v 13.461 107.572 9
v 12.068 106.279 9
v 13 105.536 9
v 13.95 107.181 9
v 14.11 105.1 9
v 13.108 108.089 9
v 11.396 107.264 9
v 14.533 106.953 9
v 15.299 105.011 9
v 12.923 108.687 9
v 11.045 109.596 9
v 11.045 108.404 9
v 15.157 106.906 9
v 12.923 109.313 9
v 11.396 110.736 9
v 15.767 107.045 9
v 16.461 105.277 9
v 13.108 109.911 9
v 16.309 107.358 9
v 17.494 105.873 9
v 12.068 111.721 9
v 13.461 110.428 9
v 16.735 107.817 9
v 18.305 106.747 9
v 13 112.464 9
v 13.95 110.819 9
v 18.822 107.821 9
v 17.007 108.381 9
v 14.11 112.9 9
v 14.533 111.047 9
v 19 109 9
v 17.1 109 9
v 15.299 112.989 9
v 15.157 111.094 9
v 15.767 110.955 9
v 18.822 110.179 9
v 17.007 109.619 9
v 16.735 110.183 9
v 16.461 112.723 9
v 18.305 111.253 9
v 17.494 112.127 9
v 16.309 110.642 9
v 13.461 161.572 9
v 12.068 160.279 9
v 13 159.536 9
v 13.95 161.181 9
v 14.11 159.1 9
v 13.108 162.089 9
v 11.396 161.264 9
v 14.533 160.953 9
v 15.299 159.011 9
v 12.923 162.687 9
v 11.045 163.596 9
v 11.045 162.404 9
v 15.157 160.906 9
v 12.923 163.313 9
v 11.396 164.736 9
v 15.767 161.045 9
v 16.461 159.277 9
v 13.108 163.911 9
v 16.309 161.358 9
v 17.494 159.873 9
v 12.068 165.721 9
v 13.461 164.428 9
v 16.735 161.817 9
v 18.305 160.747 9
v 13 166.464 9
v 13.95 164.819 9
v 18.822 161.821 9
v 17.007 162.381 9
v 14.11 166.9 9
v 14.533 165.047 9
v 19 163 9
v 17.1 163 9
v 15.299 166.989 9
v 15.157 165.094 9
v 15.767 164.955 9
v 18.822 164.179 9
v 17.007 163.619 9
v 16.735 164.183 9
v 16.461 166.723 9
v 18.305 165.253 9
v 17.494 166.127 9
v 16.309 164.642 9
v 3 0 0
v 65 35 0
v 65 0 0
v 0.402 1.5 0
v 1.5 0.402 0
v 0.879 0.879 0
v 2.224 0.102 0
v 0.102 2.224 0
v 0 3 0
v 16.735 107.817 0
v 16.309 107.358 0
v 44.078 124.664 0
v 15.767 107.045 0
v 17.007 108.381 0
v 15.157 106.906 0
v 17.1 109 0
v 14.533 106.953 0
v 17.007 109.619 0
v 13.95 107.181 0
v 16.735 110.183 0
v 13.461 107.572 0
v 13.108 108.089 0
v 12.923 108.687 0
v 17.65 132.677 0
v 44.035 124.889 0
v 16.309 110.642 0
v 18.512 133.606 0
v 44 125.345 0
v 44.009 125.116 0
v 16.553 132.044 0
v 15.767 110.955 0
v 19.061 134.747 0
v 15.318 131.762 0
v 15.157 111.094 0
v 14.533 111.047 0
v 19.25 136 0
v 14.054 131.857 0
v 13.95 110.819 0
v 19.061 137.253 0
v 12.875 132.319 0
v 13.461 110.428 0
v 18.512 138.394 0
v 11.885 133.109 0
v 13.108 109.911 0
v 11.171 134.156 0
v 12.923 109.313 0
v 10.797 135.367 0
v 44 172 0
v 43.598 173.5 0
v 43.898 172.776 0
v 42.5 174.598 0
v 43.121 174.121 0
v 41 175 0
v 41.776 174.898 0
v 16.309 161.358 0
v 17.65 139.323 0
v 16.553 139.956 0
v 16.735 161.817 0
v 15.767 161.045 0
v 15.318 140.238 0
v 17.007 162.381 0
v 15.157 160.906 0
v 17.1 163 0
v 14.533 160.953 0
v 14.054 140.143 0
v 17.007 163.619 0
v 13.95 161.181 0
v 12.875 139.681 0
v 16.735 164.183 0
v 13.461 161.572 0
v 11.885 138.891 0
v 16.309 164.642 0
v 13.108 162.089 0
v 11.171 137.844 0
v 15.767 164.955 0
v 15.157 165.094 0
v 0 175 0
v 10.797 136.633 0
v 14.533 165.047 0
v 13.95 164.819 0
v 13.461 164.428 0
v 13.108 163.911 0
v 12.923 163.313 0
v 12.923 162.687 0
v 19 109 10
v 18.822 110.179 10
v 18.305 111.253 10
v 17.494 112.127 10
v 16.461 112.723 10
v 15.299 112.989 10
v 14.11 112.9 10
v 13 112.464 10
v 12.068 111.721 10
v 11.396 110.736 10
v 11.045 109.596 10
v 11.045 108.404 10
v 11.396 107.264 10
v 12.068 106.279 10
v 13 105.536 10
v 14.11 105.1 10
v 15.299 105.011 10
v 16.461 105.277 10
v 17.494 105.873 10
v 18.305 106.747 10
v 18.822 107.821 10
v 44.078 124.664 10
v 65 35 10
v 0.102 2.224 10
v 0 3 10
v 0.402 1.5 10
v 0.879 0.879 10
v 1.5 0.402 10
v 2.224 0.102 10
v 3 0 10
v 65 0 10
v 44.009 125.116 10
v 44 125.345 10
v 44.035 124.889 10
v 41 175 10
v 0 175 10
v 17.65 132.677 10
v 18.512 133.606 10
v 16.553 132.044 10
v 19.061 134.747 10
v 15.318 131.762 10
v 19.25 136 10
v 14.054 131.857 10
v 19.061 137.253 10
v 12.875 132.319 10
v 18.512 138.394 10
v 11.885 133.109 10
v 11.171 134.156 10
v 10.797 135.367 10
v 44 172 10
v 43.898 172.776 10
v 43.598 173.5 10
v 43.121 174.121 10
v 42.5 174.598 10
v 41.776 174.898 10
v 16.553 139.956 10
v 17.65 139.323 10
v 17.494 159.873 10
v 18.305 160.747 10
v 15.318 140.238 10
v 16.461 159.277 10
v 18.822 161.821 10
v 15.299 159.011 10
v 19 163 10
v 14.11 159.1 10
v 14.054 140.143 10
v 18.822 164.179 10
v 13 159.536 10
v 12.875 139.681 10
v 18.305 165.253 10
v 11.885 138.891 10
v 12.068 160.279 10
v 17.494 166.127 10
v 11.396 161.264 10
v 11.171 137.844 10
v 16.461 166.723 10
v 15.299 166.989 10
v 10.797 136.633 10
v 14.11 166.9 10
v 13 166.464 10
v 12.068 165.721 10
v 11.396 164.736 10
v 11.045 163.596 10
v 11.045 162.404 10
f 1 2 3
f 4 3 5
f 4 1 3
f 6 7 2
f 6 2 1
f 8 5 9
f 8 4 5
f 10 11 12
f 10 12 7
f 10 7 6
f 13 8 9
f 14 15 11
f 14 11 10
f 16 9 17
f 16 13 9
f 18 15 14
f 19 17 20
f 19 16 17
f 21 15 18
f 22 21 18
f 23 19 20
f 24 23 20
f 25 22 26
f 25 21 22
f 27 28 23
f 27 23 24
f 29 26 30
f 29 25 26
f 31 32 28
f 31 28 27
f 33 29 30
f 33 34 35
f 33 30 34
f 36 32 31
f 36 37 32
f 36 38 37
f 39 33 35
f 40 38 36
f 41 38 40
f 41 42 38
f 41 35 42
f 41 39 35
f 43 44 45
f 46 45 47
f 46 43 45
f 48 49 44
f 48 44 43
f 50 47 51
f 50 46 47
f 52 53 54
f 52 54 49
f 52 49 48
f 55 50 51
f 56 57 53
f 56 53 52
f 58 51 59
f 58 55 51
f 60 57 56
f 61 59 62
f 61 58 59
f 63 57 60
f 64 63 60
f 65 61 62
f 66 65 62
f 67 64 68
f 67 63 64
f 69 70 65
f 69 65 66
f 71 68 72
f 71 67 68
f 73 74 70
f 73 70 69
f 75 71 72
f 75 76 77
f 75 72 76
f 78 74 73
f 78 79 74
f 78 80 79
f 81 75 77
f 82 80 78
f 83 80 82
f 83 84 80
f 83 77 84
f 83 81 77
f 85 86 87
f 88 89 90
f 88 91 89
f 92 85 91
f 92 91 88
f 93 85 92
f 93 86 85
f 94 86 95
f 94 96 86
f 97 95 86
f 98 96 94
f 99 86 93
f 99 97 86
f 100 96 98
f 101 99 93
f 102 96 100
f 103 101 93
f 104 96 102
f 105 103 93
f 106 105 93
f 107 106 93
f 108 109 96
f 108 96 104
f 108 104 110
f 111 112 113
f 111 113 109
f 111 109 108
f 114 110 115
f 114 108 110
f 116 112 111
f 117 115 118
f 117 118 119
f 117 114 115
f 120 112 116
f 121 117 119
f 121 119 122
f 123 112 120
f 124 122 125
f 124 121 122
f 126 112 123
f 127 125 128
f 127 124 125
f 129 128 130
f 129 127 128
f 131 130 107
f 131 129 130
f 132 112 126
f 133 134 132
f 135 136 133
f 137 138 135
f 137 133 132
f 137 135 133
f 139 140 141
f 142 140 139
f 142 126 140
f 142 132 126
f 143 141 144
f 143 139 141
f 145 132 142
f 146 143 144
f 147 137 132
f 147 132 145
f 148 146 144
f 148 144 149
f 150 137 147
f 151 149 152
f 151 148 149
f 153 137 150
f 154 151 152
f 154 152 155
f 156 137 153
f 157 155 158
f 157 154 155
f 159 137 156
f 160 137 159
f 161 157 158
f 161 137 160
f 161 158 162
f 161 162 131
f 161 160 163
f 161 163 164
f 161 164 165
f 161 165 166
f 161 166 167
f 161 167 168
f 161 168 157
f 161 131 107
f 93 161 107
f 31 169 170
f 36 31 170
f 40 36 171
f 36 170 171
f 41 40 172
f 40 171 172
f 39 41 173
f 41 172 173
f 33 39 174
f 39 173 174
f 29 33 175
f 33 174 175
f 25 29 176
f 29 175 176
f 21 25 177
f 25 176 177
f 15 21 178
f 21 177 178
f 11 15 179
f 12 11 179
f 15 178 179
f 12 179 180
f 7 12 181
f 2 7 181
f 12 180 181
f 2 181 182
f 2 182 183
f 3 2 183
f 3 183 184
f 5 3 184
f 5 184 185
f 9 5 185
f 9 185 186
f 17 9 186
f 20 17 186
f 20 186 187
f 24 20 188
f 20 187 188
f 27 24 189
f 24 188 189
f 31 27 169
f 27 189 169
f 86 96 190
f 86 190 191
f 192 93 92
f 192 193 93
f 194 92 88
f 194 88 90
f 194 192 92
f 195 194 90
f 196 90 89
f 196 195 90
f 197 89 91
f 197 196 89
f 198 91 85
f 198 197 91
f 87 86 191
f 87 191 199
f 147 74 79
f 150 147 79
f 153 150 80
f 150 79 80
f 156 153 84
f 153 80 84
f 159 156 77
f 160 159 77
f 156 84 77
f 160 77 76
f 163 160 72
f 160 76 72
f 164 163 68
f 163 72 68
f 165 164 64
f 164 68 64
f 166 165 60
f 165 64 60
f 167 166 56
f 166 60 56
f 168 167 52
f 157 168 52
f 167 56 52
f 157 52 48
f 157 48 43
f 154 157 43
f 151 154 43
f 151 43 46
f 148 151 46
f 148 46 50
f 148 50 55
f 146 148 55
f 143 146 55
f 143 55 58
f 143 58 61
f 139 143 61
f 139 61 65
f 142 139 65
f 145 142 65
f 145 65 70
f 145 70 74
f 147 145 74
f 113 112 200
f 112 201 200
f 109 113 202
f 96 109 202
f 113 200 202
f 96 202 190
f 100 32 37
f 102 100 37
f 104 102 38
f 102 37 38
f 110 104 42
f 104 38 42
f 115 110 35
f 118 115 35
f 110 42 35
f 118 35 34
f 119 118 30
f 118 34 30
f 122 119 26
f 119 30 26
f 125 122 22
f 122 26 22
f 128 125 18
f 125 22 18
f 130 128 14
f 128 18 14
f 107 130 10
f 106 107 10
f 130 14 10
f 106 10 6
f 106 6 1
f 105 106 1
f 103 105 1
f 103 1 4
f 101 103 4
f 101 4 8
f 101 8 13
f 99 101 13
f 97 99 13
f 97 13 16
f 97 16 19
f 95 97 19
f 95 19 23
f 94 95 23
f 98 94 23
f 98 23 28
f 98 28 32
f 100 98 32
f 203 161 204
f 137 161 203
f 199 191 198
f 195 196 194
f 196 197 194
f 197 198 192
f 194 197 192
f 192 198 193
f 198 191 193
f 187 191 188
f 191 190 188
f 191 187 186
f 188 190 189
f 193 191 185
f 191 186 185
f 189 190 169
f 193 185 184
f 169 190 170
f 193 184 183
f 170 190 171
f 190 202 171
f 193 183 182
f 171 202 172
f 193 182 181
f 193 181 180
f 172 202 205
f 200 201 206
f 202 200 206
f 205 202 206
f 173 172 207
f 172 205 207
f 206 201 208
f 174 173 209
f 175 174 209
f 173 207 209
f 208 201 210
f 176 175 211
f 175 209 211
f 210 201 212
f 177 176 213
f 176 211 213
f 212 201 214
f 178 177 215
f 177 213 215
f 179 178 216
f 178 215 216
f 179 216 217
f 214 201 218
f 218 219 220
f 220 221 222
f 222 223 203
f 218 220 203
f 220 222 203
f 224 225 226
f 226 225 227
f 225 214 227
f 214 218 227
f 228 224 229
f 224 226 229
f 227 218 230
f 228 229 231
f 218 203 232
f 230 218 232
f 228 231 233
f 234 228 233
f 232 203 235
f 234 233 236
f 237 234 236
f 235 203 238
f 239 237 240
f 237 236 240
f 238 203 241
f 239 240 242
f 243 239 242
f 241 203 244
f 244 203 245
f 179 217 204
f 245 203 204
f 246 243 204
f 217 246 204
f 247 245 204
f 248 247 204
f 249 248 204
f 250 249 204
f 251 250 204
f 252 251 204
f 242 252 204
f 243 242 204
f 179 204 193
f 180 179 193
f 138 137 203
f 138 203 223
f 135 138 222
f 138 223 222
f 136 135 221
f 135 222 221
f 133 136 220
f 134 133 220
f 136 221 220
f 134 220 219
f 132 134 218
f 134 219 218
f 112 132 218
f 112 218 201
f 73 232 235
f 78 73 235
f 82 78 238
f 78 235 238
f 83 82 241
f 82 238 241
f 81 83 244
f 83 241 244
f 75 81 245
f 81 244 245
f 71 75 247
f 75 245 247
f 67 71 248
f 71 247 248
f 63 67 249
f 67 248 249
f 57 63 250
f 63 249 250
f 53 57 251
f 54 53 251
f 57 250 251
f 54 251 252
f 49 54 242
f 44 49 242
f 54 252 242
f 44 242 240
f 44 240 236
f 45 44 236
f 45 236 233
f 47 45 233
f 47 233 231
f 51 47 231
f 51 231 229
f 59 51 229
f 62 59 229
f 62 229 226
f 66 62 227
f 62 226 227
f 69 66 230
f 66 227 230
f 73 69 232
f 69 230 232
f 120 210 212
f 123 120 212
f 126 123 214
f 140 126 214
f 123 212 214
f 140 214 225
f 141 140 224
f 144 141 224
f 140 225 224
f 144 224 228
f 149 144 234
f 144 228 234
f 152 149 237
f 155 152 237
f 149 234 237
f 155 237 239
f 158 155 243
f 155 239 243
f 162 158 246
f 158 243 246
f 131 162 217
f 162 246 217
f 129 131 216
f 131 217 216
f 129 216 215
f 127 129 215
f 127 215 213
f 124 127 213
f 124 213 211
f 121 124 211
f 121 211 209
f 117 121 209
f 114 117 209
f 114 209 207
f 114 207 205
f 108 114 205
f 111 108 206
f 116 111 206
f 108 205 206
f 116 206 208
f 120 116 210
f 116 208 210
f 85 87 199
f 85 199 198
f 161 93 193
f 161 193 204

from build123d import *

# Parameters (mm, degrees)
EXTRUDE_1_DEPTH     = 10
SKETCH_6_R          = 2.1
CUT_EXTRUDE_5_DEPTH = 187.949190958
SKETCH_7_R          = 4
CUT_EXTRUDE_6_DEPTH = 1
FILLET_1_R          = 3
SKETCH_8_R          = 4.25
CUT_EXTRUDE_7_DEPTH = 10


with BuildPart() as part:
    # 草图5 → 凸台-拉伸1 (new body)
    with BuildSketch(Plane.XY):
        Polygon((0, 0), (0, 175), (44, 175), (44, 125), (65, 35), (65, 0), align=None)
    extrude(amount=EXTRUDE_1_DEPTH)

    # 草图6 → 切除-拉伸5 (cut, through all)
    with BuildSketch(Plane.XY.offset(10)):
        with Locations((15, 163)):
            Circle(SKETCH_6_R)
        with Locations((15, 109)):
            Circle(SKETCH_6_R)
    extrude(amount=-CUT_EXTRUDE_5_DEPTH, mode=Mode.SUBTRACT)

    # 草图7 → 切除-拉伸6 (cut)
    with BuildSketch(Plane.XY.offset(10)):
        with Locations((15, 163)):
            Circle(SKETCH_7_R)
        with Locations((15, 109)):
            Circle(SKETCH_7_R)
    extrude(amount=-CUT_EXTRUDE_6_DEPTH, mode=Mode.SUBTRACT)

    # 圆角1
    fillet_1_edges = [part.edges().sort_by_distance(p)[0] for p in [
        (0, 0, 5),
        (44, 175, 5),
        (44, 125, 5),
    ]]
    fillet(fillet_1_edges, radius=FILLET_1_R)

    # 草图8 → 切除-拉伸7 (cut)
    with BuildSketch(Plane.XY.offset(10)):
        with Locations((15, 136)):
            Circle(SKETCH_8_R)
    extrude(amount=-CUT_EXTRUDE_7_DEPTH, mode=Mode.SUBTRACT)


solid = part.part
